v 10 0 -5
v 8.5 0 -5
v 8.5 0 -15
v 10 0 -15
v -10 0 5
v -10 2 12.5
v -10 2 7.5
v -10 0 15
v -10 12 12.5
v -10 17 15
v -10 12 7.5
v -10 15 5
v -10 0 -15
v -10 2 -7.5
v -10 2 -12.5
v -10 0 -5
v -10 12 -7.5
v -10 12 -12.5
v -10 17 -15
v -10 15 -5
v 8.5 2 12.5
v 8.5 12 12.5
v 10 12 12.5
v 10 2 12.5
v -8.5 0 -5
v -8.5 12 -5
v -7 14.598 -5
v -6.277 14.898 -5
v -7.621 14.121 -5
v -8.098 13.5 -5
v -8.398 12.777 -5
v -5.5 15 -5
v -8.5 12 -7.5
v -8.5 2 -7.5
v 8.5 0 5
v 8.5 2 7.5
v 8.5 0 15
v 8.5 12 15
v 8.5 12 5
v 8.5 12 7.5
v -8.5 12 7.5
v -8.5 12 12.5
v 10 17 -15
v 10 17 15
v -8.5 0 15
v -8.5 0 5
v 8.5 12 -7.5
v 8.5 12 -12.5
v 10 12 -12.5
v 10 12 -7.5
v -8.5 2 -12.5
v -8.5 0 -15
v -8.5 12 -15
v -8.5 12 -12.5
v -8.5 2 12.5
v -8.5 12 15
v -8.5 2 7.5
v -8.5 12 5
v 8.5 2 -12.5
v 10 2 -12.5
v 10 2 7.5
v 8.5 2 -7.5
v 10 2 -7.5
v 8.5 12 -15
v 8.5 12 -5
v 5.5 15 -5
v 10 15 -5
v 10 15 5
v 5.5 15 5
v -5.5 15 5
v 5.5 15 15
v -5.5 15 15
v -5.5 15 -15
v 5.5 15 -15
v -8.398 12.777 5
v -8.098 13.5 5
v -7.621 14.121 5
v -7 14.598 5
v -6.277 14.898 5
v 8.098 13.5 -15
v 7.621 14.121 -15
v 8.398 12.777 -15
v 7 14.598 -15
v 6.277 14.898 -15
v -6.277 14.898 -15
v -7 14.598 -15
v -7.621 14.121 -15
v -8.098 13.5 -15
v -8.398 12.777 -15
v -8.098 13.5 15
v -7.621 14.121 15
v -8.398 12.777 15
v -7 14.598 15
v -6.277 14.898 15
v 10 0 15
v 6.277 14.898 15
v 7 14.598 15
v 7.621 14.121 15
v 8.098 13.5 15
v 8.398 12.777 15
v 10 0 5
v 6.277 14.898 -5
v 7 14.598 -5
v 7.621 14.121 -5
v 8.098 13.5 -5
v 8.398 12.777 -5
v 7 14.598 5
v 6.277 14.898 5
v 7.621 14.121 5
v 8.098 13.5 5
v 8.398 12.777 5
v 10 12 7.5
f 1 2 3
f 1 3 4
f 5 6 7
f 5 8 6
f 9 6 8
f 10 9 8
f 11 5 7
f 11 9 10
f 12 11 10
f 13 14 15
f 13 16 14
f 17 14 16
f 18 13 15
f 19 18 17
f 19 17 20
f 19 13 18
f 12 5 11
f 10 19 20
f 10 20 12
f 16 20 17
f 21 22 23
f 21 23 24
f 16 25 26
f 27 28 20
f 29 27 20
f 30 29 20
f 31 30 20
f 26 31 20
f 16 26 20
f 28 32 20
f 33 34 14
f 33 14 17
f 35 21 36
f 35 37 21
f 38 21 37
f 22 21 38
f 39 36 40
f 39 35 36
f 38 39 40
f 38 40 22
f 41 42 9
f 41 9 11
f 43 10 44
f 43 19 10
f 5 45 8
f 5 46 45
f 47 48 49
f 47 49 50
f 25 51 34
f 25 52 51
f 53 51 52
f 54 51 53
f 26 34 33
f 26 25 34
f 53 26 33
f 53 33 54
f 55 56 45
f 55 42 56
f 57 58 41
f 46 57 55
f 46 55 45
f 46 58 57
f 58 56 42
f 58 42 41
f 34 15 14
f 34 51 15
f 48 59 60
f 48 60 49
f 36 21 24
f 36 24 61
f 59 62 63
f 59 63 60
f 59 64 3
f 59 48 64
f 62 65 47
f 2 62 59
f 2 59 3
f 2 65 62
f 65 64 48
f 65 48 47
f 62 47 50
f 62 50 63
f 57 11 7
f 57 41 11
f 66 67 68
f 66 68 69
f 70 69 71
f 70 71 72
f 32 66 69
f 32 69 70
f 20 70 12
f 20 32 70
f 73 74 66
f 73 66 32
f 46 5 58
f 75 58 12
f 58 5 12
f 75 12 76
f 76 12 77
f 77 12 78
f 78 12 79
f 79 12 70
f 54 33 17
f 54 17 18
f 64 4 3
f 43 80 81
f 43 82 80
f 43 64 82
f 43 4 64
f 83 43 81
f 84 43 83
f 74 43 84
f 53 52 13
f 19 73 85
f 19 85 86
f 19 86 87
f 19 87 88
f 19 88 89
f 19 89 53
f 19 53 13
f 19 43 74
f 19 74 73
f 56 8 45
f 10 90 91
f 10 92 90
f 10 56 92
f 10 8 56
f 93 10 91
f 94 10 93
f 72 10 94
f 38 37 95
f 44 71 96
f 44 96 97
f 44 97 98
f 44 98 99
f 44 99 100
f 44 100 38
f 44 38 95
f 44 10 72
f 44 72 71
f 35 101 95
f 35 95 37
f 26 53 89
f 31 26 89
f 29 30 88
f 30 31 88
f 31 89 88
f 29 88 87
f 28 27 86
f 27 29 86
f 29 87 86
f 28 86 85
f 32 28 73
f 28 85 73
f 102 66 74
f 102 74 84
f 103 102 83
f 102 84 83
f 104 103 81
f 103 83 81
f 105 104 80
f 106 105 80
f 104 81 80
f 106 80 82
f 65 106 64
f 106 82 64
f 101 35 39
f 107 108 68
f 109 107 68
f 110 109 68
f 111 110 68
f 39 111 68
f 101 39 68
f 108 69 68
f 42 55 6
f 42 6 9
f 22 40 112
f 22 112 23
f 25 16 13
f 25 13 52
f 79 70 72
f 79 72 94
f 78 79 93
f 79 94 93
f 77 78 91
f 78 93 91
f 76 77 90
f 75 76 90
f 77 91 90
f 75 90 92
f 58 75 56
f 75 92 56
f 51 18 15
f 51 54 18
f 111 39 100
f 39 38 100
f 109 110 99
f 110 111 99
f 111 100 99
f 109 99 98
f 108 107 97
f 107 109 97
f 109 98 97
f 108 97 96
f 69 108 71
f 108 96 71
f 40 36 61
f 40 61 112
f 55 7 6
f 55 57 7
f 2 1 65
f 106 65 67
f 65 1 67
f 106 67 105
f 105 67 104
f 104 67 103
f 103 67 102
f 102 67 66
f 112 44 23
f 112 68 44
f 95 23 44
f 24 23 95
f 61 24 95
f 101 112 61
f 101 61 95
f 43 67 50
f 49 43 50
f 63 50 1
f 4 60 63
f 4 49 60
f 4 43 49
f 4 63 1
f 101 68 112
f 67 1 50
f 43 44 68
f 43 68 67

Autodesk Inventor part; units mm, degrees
ref_plane "YZ Plane" through (0, 0, 0) normal (1, 0, 0) x (0, 1, 0)
ref_plane "XZ Plane" through (0, 0, 0) normal (0, 1, 0) x (-1, 0, 0)
ref_plane "XY Plane" through (0, 0, 0) normal (0, 0, 1) x (1, 0, 0)
sketch "スケッチ1" plane through (0, 0, 0) normal (0, 0, 1) x (1, 0, 0)
  line L0 (-10, 17) -> (0, 17)
  line L1 (0, 17) -> (0, 15)
  line L2 (0, 15) -> (-10, 15)
  line L3 (-10, 15) -> (-10, 17)
  line L4 (0, -3.4) -> (0, 20.4) projected
  point P0 (0, 0)
  dimension "d0" = 10
  dimension "d1" = 2
  dimension "d2" = 15
extrude "押し出し1" add sketch "スケッチ1" along normal blind 5
sketch "スケッチ2" plane through (0, 0, 5) normal (0, 0, 1) x (1, 0, 0)
  line L0 (0, 17) -> (-10, 17) projected
  line L1 (-10, 17) -> (-8.5, 17)
  line L2 (-8.5, 17) -> (-8.5, 0)
  line L3 (-8.5, 0) -> (-10, 0)
  line L4 (-10, 0) -> (-10, 17)
  line L5 (-10, 15) -> (0, 15) projected
  line L6 (0, 15) -> (0, 17) projected
  line L7 (0, 17) -> (-10, 17) projected
  line L8 (-10, 17) -> (-10, 15) projected
  point P0 (0, 0)
  point P1 (-8.5, 15)
  dimension "d5" = 1.5
extrude "押し出し2" add sketch "スケッチ2" along normal blind 10
sketch "スケッチ3" plane through (-8.5, 0, 5) normal (1, 0, 0) x (0, 0, -1)
  line L0 (-7.5, 12) -> (-2.5, 12)
  line L1 (-2.5, 12) -> (-2.5, 2)
  line L2 (-2.5, 2) -> (-7.5, 2)
  line L3 (-7.5, 2) -> (-7.5, 12)
  line L4 (0, 0) -> (-10, 0) projected
  line L5 (0, 15) -> (-10, 15) projected
  point P0 (5, 0)
  point P1 (-5, 2)
  point P2 (-5, 0)
  dimension "d8" = 2
  dimension "d9" = 5
  dimension "d13" = 3
extrude "押し出し3" cut sketch "スケッチ3" against normal through all
fillet "フィレット1" radius 3 1 edges at (-8.5, 15, 10)
mirror "ミラー1" about plane through (0, 15, 0) normal (1, 0, 0)
mirror "ミラー2" about plane through (-5, 16, 0) normal (0, 0, -1)
properties part number "connetcor_female"
